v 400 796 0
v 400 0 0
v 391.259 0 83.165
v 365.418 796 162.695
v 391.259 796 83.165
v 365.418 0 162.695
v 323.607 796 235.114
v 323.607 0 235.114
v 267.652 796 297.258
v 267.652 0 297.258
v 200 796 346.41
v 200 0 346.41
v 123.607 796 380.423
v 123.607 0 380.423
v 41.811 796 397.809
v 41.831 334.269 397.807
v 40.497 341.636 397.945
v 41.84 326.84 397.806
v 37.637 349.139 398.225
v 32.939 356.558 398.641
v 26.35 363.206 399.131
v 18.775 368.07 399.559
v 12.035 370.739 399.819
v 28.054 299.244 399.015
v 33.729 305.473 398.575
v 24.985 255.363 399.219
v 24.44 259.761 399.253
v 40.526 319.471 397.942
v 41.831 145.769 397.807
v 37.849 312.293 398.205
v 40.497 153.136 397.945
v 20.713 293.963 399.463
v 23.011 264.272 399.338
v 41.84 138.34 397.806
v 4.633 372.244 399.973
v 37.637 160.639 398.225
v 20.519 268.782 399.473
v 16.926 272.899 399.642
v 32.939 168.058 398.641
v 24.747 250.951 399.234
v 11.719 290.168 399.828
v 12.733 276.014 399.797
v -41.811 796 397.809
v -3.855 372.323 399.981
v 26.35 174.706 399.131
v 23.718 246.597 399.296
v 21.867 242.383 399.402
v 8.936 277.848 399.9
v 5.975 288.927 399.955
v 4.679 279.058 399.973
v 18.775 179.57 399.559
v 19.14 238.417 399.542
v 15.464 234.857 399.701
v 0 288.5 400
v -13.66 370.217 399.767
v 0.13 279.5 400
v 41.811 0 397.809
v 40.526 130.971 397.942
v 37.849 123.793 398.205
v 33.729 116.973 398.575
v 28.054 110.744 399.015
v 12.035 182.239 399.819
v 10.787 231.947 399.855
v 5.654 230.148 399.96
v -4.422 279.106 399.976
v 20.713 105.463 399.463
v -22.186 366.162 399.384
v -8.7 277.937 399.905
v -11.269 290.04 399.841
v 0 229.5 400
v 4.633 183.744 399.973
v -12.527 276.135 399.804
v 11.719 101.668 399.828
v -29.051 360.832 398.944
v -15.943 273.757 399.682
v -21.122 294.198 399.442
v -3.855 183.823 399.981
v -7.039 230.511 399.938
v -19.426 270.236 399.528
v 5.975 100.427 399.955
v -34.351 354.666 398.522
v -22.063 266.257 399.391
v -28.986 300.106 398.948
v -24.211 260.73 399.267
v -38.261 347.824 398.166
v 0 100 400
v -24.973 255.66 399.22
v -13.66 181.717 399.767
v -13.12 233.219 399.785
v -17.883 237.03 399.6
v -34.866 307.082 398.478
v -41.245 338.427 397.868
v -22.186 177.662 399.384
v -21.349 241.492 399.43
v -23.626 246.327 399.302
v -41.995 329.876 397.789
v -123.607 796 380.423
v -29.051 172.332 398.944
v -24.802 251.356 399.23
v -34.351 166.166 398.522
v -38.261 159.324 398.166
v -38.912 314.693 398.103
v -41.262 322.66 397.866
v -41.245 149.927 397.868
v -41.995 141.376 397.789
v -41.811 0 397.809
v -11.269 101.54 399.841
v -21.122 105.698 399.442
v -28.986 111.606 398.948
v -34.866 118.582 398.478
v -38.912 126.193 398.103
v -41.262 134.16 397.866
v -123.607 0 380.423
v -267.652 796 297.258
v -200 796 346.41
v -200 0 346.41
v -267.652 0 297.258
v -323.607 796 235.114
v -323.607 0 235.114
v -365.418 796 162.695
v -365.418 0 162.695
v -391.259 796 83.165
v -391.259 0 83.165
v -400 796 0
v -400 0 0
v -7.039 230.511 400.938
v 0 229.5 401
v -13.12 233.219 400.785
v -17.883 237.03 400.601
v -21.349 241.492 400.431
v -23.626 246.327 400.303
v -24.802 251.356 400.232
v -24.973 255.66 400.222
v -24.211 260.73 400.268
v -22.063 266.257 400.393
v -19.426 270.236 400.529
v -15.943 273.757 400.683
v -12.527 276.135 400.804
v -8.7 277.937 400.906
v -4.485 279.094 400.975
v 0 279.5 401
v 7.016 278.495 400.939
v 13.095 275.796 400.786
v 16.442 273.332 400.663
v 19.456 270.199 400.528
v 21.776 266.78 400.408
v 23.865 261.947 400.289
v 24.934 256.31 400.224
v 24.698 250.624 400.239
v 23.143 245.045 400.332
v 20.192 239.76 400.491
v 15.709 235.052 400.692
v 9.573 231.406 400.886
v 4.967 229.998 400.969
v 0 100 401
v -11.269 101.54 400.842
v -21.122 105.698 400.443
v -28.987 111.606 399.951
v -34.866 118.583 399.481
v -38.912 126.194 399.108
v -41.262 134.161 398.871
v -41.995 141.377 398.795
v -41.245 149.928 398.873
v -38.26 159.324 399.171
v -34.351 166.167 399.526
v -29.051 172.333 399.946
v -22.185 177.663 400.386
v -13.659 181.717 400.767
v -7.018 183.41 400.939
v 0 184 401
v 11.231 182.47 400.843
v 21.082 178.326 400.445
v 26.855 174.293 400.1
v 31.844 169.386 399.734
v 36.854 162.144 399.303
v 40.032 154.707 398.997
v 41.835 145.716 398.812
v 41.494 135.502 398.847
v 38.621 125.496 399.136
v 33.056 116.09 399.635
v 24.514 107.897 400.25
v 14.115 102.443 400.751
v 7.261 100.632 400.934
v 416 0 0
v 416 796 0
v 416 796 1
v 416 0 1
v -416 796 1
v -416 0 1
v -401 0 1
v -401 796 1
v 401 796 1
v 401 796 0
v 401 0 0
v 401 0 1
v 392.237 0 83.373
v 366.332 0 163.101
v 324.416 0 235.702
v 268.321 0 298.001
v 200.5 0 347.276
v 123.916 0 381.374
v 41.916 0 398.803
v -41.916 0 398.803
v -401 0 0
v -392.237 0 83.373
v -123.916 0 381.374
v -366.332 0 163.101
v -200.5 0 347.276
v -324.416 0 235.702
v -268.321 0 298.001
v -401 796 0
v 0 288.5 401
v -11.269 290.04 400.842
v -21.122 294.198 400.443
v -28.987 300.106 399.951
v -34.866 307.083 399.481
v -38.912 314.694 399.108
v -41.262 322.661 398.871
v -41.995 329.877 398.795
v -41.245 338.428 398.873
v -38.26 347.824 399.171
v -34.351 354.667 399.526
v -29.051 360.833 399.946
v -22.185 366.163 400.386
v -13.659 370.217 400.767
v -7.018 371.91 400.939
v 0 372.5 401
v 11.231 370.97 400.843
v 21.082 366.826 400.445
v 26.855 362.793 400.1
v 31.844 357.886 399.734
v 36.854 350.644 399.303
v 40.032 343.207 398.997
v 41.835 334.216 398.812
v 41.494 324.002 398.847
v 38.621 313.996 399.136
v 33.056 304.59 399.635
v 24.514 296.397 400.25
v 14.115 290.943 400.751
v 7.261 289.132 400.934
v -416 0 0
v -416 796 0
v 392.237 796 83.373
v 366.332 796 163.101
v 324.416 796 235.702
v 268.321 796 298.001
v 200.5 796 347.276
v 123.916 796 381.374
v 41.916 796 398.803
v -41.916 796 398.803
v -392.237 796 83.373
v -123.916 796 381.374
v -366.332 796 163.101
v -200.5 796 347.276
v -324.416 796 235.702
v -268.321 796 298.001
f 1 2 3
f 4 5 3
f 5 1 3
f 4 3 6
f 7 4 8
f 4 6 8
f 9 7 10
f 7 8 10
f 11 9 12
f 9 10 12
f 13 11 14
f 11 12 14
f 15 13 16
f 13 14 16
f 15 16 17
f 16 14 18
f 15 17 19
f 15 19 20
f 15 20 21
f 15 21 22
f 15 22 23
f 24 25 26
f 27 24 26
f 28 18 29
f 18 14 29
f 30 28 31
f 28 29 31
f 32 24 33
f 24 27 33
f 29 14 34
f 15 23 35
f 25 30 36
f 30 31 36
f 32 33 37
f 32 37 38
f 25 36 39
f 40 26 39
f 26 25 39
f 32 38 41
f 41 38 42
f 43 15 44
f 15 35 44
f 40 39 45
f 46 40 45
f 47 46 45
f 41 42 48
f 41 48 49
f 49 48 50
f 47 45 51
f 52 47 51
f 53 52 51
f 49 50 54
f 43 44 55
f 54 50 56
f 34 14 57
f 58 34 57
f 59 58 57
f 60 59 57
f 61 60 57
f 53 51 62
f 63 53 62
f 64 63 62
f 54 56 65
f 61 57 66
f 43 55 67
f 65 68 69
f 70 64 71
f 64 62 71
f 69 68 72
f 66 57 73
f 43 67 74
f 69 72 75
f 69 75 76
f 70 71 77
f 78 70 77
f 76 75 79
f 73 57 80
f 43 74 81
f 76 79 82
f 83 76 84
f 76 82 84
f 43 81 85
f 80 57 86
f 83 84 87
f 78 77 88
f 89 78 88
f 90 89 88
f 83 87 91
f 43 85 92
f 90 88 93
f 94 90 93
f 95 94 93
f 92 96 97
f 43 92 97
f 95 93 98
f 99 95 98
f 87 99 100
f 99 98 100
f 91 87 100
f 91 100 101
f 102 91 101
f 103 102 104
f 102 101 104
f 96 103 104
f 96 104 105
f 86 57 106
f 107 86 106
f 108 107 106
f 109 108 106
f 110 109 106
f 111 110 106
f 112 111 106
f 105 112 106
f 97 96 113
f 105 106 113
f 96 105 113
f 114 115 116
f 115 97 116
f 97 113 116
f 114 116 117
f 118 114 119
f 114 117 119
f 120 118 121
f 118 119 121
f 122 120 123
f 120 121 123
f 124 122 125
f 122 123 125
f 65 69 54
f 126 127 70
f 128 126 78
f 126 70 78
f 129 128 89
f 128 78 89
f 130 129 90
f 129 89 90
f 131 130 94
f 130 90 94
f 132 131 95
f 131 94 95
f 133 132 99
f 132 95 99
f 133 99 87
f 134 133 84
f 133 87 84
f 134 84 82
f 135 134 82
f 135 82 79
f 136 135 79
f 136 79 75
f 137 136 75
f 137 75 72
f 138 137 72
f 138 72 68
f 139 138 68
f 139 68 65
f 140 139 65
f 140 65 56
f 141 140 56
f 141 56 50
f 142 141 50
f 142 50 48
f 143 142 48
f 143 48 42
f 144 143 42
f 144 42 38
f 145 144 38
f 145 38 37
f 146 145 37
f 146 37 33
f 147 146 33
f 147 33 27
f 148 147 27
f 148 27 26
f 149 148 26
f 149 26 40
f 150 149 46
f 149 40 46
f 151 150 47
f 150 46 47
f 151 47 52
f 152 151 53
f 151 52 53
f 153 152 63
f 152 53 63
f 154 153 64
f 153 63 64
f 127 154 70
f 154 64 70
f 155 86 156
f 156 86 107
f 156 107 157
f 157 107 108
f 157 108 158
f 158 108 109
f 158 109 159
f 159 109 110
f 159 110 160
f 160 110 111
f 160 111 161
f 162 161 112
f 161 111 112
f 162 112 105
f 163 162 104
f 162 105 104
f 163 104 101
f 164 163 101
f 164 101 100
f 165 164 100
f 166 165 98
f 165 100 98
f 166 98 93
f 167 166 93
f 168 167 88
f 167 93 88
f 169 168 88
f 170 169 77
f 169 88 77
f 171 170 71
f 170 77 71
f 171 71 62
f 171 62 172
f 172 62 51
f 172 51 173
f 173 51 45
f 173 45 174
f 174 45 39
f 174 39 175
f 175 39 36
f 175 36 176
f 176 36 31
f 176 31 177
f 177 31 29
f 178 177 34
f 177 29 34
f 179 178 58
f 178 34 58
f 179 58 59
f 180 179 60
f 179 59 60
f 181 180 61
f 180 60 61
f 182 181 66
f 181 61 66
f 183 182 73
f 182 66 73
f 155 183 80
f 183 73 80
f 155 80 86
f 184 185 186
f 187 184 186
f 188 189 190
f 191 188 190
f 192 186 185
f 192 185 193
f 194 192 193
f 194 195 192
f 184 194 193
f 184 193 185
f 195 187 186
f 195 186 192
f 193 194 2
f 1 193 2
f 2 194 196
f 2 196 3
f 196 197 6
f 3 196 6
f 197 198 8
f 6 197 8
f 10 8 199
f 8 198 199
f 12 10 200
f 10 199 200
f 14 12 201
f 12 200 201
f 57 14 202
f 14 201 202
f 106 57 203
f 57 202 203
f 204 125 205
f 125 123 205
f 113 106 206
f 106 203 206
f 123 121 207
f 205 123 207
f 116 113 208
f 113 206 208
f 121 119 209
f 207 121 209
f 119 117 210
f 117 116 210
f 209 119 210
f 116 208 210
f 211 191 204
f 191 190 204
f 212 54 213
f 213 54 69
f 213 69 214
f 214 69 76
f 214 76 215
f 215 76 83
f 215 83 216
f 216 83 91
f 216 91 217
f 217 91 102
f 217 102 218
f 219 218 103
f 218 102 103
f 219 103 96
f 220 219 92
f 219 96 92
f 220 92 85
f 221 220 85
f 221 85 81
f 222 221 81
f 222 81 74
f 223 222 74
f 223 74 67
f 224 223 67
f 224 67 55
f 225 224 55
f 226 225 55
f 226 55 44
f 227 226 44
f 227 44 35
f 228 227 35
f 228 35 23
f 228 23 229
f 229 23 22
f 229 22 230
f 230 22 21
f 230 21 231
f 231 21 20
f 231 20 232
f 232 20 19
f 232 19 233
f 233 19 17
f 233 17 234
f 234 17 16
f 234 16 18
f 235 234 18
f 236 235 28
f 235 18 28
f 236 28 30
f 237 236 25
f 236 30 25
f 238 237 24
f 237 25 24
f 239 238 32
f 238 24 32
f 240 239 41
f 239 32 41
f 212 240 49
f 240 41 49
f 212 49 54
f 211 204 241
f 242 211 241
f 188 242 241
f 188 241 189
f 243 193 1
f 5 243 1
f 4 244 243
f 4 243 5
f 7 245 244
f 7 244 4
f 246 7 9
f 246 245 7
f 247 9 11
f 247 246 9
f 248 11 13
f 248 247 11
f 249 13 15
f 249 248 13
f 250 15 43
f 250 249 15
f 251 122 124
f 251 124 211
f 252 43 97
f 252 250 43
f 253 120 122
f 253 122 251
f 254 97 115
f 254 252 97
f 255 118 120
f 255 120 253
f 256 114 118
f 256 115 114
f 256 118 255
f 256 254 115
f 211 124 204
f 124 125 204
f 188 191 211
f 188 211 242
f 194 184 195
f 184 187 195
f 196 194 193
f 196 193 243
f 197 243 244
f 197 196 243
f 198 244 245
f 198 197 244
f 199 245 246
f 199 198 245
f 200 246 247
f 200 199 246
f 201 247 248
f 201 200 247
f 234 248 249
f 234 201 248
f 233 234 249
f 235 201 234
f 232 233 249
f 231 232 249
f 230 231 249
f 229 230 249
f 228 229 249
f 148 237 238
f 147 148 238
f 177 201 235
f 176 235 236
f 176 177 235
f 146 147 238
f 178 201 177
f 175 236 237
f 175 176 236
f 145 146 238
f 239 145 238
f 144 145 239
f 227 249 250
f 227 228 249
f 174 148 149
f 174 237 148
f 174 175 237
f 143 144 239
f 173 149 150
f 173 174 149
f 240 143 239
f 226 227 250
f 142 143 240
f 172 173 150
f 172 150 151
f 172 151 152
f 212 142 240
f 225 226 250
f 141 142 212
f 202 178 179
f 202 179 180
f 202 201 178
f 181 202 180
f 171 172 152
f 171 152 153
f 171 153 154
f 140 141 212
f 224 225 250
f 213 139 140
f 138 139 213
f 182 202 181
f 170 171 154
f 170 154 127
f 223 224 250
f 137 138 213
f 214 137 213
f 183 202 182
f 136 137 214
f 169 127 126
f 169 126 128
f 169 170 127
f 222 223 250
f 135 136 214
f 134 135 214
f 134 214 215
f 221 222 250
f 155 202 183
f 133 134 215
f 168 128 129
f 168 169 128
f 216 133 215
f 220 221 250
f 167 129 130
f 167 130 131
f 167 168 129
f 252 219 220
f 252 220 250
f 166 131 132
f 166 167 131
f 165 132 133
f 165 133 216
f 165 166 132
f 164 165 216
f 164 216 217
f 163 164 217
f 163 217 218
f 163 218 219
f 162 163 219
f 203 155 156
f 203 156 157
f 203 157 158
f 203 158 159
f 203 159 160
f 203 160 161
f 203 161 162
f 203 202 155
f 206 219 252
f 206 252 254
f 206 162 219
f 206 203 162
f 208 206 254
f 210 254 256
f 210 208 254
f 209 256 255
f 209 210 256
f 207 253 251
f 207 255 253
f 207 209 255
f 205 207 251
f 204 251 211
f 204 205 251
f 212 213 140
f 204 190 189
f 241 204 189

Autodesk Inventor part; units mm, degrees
ref_plane "YZ Plane" through (0, 0, 0) normal (1, 0, 0) x (0, 1, 0)
ref_plane "XZ Plane" through (0, 0, 0) normal (0, 1, 0) x (-1, 0, 0)
sketch "Sketch1" plane through (0, 0, 0) normal (0, 1, 0) x (-1, 0, 0)
  arc A0 (401, 0) -> (-401, 0) centre (0, 0) ccw
  line L0 (0, 0) -> (-401, 0) construction
  line L1 (0, 0) -> (401, 0) construction
  arc A1 (400, 0) -> (-400, 0) centre (0, 0) ccw
  line L2 (0, 0) -> (-400, 0) construction
  line L3 (0, 0) -> (400, 0) construction
  line L4 (-401, 0) -> (-400, 0)
  line L5 (400, 0) -> (401, 0)
  dimension "d0" = 401
  dimension "d1" = 180
  dimension "d2" = 400
  dimension "d3" = 180
extrude "Extrusion1" add sketch "Sketch1" along normal blind 796
sketch "Sketch2" plane through (0, 0, 0) normal (0, 1, 0) x (-1, 0, 0)
  line L0 (-401, 0) -> (-416, 0)
  line L1 (-416, 0) -> (-416, 1)
  line L2 (-416, 1) -> (-401, 1)
  line L3 (-401, 1) -> (-401, 0)
  point P0 (0, 0)
  dimension "d6" = 15
  dimension "d7" = 1
extrude "Extrusion2" add sketch "Sketch2" along normal blind 796
sketch "Sketch3" plane through (0, 0, 0) normal (0, 1, 0) x (-1, 0, 0)
  line L0 (401, 0) -> (416, 0)
  line L1 (416, 0) -> (416, 1)
  line L2 (416, 1) -> (401, 1)
  line L3 (401, 1) -> (401, 0)
  point P0 (0, 0)
  dimension "d10" = 15
  dimension "d11" = 1
extrude "Extrusion3" add sketch "Sketch3" along normal blind 796
sketch "Sketch4" plane through (0, 0, 0) normal (0, 1, 0) x (-1, 0, 0)
  line L0 (0, 0) -> (0, 401)
  dimension "d14" = 401
ref_plane "Work Plane1" through (0, 0, 401) normal (0, 0, 1) x (1, 0, 0)
sketch "Sketch5" plane through (0, 0, 401) normal (0, 0, 1) x (1, 0, 0)
  circle A0 centre (0, 254.5) radius 25
  line L0 (401, 0) -> (-401, 0) projected
  point P0 (0, 0)
  dimension "d15" = 50
  dimension "d16" = 254.5
hole "Hole1" at (0, 254.5, 401) direction (0, 0, -1) diameter 50 end through all
sketch "Sketch6" plane through (0, 0, 401) normal (0, 0, 1) x (1, 0, 0)
  circle A0 centre (0, 330.5) radius 42
  line L0 (401, 0) -> (-401, 0) projected
  point P0 (0, 0)
  dimension "d24" = 84
  dimension "d25" = 330.5
hole "Hole2" at (0, 330.5, 401) direction (0, 0, -1) diameter 84 end through all
sketch "Sketch7" plane through (0, 0, 401) normal (0, 0, 1) x (1, 0, 0)
  circle A0 centre (0, 254.5) radius 25
  line L0 (401, 0) -> (-401, 0) projected
  point P0 (0, 0)
  dimension "d33" = 50
  dimension "d34" = 254.5
sketch "Sketch8" plane through (0, 0, 401) normal (0, 0, 1) x (1, 0, 0)
  circle A0 centre (0, 142) radius 42
  line L0 (401, 0) -> (-401, 0) projected
  point P0 (0, 0)
  dimension "d35" = 84
  dimension "d36" = 142
hole "Hole3" at (0, 142, 401) direction (0, 0, -1) diameter 84 depth 8 tip angle 118
properties part number "Lower Back Half"
